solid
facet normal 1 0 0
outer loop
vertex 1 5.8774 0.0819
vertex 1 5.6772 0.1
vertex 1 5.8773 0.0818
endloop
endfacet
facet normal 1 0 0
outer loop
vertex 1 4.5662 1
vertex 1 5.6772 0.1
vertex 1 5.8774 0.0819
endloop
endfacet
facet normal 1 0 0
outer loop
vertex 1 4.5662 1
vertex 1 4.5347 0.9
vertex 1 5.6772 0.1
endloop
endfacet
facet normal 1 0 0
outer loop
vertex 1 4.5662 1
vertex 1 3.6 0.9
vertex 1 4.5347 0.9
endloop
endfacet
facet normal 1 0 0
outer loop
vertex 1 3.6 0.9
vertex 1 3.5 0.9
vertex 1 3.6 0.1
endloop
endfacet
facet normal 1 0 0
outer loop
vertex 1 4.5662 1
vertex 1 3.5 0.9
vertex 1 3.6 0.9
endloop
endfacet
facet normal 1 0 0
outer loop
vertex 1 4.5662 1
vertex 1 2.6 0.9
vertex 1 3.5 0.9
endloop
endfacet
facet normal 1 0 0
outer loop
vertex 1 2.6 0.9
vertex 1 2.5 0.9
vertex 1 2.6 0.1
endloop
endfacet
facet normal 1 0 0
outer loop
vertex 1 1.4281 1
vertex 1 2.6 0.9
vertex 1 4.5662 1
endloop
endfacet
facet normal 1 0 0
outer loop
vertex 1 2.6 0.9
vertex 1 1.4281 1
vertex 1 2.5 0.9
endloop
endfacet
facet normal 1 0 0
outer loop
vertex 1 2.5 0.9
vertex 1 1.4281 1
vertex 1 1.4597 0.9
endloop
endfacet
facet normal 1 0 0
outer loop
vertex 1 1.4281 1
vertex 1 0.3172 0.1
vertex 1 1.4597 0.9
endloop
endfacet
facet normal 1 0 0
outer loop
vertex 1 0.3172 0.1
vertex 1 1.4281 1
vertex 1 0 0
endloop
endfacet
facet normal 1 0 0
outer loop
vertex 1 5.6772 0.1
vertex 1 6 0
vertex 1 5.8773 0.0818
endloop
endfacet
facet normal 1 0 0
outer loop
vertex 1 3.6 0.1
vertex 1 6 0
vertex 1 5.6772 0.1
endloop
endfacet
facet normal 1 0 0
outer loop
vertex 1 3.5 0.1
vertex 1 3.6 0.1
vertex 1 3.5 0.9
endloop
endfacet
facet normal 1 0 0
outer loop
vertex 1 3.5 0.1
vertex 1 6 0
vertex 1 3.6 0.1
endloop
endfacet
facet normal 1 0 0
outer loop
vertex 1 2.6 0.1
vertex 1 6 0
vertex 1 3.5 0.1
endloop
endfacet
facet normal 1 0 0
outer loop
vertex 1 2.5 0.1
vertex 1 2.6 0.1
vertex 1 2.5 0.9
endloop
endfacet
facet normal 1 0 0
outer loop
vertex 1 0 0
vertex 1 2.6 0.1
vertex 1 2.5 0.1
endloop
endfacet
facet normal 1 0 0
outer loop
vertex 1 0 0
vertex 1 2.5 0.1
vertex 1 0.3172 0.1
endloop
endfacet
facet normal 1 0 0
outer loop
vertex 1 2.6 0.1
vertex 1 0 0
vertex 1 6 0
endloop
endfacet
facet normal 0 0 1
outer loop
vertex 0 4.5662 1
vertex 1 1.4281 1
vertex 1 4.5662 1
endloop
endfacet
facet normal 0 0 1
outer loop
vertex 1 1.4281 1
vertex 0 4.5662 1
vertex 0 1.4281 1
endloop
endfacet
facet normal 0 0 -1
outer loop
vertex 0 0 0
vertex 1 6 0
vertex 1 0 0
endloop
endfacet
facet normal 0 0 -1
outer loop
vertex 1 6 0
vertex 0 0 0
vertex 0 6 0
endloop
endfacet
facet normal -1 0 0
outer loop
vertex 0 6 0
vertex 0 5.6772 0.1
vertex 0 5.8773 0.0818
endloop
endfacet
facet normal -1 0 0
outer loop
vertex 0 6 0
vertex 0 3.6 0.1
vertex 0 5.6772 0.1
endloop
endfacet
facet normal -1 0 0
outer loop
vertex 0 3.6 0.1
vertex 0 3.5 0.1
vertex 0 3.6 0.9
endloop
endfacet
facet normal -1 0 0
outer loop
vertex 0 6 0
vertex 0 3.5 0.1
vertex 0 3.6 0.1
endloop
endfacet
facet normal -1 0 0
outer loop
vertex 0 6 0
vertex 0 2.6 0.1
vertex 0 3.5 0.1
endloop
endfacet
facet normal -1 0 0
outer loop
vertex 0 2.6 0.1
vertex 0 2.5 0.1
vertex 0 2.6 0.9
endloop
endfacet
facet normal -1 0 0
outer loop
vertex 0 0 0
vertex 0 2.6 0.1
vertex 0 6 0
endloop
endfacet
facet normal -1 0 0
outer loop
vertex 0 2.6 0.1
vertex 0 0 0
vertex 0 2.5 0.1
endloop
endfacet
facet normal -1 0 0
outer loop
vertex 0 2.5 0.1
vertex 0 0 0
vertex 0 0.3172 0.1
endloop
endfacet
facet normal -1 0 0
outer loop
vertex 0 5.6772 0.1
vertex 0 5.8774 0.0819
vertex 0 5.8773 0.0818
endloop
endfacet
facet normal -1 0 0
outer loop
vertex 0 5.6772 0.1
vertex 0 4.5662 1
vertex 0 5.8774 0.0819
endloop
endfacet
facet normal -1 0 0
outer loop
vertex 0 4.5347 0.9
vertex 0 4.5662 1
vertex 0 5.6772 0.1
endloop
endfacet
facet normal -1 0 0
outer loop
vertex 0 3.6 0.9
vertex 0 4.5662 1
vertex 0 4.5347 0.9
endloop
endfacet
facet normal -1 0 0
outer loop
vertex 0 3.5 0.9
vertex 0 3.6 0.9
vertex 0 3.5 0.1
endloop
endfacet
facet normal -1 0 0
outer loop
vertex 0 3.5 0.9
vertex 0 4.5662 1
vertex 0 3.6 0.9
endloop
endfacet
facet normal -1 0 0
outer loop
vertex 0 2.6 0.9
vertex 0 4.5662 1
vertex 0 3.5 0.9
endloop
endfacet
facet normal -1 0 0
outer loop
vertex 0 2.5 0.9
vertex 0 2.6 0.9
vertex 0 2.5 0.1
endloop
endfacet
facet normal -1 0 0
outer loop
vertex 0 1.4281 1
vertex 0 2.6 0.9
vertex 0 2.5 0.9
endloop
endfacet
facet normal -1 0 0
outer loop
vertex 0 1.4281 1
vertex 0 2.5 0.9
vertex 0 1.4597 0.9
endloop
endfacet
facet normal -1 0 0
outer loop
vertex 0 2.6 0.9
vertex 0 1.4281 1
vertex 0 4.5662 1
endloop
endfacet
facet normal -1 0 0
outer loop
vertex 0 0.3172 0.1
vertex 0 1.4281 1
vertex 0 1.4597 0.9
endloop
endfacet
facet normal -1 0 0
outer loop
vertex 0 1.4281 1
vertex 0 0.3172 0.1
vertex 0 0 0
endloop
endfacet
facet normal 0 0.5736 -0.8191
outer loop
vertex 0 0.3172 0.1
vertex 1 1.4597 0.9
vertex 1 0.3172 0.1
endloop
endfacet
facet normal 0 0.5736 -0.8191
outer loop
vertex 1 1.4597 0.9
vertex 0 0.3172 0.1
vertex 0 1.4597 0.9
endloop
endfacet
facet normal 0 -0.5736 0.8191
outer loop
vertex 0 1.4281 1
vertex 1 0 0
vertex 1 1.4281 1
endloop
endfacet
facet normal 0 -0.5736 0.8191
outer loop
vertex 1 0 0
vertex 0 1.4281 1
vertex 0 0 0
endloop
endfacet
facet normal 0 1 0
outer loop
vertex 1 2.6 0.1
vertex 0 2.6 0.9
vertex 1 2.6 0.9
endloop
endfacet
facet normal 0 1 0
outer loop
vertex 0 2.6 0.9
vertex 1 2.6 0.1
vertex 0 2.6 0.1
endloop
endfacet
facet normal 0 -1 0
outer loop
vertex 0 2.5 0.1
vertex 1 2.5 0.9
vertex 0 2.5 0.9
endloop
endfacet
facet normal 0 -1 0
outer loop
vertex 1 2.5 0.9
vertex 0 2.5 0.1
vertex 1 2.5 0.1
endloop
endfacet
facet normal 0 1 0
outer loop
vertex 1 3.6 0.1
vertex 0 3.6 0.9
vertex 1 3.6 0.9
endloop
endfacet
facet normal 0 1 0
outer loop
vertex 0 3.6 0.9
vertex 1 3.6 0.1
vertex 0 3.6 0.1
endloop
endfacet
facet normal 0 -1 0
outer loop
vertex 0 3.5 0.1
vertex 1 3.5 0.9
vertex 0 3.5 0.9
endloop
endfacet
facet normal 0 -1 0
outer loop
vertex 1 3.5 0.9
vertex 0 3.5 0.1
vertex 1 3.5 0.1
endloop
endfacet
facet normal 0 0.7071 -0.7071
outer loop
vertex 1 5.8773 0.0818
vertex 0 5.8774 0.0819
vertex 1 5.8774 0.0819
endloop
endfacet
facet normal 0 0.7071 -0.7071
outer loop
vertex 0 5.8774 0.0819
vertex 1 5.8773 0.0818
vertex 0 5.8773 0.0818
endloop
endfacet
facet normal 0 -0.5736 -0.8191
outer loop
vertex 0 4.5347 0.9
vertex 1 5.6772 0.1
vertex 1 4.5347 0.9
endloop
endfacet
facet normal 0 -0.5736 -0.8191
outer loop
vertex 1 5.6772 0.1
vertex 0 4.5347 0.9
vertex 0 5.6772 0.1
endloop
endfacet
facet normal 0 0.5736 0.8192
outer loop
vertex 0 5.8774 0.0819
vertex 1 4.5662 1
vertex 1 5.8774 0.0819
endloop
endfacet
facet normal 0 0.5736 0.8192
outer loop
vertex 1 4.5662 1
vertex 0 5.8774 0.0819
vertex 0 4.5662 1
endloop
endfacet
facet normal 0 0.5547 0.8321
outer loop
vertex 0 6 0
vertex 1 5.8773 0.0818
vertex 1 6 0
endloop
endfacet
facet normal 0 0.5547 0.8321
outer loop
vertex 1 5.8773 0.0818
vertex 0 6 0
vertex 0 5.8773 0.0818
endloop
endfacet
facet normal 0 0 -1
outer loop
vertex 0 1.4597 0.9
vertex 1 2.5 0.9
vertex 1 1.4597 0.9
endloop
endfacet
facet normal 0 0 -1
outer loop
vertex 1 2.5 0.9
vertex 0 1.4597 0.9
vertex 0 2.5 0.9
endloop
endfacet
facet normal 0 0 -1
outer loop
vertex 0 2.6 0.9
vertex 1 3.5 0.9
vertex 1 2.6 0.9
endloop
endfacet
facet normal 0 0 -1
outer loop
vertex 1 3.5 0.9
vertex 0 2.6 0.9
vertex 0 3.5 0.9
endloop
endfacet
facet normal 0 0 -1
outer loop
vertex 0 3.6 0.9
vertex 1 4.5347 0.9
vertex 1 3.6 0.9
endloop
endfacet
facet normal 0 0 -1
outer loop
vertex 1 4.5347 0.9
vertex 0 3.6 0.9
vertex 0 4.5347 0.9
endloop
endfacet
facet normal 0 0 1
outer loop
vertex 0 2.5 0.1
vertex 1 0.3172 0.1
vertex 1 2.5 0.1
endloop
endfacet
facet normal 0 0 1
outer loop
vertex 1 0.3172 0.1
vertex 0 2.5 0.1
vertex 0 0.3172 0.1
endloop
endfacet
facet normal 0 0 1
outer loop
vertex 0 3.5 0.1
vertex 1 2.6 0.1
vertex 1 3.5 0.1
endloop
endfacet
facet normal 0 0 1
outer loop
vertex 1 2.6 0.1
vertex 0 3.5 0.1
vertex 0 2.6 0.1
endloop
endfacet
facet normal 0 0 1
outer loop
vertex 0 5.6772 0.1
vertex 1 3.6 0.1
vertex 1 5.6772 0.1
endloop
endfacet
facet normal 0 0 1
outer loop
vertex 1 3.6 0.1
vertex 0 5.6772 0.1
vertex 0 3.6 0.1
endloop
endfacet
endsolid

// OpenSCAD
Bridge_Width=1;
Bridge_Height=1;
Thickness=.1;
Inner_Height=Bridge_Height-Thickness*2;
Distance_1=0;
Distance_2=2.5;
Distance_3=3.5;
Distance_4=5.82;
Angle_1=-55;
Angle_2=0;
Angle_3=-0;
Angle_4=55;

union() {
intersection(){
cube(size=[Bridge_Width,6,Bridge_Height], center=false);

translate([0,Distance_1,0]) 
rotate([Angle_1, 0, 0])
cube(size=[Bridge_Width,Thickness,6]);
}
intersection(){
cube(size=[Bridge_Width,6,Bridge_Height], center=false);
translate([0,Distance_2,]) 
rotate([Angle_2, 0, 0])
cube(size=[Bridge_Width,Thickness,6]);
}
intersection(){
cube(size=[Bridge_Width,6,Bridge_Height], center=false);
translate([0,Distance_3,0]) 
rotate([Angle_3, 0, 0])
cube(size=[Bridge_Width,Thickness,6]);
}
intersection(){
cube(size=[Bridge_Width,6,Bridge_Height], center=false);
translate([0,Distance_4,0]) 
rotate([Angle_4, 0, 0])
cube(size=[Bridge_Width,Thickness,6]);
}
  difference()
  {
 polyhedron(
  points=[[0,0,0],
          [Bridge_Width,0,0],
          [Bridge_Width,6,0],
          [0,6,0], // base
          [0,1.5,Bridge_Height],
          [Bridge_Width,1.5,Bridge_Height],
          [Bridge_Width,4.5,Bridge_Height],
          [0,4.5,Bridge_Height]], // top 
  faces=[ [0,1,2,3], // bottom
          [4,5,1,0], // front
          [7,6,5,4], // top
          [5,6,2,1], // right
          [6,7,3,2], // back
          [7,4,0,3] ] // left
 );
      translate([-.5,0,Thickness]) 
          cube(size=[4,7,Inner_Height],center=false);
      
  }
  }
